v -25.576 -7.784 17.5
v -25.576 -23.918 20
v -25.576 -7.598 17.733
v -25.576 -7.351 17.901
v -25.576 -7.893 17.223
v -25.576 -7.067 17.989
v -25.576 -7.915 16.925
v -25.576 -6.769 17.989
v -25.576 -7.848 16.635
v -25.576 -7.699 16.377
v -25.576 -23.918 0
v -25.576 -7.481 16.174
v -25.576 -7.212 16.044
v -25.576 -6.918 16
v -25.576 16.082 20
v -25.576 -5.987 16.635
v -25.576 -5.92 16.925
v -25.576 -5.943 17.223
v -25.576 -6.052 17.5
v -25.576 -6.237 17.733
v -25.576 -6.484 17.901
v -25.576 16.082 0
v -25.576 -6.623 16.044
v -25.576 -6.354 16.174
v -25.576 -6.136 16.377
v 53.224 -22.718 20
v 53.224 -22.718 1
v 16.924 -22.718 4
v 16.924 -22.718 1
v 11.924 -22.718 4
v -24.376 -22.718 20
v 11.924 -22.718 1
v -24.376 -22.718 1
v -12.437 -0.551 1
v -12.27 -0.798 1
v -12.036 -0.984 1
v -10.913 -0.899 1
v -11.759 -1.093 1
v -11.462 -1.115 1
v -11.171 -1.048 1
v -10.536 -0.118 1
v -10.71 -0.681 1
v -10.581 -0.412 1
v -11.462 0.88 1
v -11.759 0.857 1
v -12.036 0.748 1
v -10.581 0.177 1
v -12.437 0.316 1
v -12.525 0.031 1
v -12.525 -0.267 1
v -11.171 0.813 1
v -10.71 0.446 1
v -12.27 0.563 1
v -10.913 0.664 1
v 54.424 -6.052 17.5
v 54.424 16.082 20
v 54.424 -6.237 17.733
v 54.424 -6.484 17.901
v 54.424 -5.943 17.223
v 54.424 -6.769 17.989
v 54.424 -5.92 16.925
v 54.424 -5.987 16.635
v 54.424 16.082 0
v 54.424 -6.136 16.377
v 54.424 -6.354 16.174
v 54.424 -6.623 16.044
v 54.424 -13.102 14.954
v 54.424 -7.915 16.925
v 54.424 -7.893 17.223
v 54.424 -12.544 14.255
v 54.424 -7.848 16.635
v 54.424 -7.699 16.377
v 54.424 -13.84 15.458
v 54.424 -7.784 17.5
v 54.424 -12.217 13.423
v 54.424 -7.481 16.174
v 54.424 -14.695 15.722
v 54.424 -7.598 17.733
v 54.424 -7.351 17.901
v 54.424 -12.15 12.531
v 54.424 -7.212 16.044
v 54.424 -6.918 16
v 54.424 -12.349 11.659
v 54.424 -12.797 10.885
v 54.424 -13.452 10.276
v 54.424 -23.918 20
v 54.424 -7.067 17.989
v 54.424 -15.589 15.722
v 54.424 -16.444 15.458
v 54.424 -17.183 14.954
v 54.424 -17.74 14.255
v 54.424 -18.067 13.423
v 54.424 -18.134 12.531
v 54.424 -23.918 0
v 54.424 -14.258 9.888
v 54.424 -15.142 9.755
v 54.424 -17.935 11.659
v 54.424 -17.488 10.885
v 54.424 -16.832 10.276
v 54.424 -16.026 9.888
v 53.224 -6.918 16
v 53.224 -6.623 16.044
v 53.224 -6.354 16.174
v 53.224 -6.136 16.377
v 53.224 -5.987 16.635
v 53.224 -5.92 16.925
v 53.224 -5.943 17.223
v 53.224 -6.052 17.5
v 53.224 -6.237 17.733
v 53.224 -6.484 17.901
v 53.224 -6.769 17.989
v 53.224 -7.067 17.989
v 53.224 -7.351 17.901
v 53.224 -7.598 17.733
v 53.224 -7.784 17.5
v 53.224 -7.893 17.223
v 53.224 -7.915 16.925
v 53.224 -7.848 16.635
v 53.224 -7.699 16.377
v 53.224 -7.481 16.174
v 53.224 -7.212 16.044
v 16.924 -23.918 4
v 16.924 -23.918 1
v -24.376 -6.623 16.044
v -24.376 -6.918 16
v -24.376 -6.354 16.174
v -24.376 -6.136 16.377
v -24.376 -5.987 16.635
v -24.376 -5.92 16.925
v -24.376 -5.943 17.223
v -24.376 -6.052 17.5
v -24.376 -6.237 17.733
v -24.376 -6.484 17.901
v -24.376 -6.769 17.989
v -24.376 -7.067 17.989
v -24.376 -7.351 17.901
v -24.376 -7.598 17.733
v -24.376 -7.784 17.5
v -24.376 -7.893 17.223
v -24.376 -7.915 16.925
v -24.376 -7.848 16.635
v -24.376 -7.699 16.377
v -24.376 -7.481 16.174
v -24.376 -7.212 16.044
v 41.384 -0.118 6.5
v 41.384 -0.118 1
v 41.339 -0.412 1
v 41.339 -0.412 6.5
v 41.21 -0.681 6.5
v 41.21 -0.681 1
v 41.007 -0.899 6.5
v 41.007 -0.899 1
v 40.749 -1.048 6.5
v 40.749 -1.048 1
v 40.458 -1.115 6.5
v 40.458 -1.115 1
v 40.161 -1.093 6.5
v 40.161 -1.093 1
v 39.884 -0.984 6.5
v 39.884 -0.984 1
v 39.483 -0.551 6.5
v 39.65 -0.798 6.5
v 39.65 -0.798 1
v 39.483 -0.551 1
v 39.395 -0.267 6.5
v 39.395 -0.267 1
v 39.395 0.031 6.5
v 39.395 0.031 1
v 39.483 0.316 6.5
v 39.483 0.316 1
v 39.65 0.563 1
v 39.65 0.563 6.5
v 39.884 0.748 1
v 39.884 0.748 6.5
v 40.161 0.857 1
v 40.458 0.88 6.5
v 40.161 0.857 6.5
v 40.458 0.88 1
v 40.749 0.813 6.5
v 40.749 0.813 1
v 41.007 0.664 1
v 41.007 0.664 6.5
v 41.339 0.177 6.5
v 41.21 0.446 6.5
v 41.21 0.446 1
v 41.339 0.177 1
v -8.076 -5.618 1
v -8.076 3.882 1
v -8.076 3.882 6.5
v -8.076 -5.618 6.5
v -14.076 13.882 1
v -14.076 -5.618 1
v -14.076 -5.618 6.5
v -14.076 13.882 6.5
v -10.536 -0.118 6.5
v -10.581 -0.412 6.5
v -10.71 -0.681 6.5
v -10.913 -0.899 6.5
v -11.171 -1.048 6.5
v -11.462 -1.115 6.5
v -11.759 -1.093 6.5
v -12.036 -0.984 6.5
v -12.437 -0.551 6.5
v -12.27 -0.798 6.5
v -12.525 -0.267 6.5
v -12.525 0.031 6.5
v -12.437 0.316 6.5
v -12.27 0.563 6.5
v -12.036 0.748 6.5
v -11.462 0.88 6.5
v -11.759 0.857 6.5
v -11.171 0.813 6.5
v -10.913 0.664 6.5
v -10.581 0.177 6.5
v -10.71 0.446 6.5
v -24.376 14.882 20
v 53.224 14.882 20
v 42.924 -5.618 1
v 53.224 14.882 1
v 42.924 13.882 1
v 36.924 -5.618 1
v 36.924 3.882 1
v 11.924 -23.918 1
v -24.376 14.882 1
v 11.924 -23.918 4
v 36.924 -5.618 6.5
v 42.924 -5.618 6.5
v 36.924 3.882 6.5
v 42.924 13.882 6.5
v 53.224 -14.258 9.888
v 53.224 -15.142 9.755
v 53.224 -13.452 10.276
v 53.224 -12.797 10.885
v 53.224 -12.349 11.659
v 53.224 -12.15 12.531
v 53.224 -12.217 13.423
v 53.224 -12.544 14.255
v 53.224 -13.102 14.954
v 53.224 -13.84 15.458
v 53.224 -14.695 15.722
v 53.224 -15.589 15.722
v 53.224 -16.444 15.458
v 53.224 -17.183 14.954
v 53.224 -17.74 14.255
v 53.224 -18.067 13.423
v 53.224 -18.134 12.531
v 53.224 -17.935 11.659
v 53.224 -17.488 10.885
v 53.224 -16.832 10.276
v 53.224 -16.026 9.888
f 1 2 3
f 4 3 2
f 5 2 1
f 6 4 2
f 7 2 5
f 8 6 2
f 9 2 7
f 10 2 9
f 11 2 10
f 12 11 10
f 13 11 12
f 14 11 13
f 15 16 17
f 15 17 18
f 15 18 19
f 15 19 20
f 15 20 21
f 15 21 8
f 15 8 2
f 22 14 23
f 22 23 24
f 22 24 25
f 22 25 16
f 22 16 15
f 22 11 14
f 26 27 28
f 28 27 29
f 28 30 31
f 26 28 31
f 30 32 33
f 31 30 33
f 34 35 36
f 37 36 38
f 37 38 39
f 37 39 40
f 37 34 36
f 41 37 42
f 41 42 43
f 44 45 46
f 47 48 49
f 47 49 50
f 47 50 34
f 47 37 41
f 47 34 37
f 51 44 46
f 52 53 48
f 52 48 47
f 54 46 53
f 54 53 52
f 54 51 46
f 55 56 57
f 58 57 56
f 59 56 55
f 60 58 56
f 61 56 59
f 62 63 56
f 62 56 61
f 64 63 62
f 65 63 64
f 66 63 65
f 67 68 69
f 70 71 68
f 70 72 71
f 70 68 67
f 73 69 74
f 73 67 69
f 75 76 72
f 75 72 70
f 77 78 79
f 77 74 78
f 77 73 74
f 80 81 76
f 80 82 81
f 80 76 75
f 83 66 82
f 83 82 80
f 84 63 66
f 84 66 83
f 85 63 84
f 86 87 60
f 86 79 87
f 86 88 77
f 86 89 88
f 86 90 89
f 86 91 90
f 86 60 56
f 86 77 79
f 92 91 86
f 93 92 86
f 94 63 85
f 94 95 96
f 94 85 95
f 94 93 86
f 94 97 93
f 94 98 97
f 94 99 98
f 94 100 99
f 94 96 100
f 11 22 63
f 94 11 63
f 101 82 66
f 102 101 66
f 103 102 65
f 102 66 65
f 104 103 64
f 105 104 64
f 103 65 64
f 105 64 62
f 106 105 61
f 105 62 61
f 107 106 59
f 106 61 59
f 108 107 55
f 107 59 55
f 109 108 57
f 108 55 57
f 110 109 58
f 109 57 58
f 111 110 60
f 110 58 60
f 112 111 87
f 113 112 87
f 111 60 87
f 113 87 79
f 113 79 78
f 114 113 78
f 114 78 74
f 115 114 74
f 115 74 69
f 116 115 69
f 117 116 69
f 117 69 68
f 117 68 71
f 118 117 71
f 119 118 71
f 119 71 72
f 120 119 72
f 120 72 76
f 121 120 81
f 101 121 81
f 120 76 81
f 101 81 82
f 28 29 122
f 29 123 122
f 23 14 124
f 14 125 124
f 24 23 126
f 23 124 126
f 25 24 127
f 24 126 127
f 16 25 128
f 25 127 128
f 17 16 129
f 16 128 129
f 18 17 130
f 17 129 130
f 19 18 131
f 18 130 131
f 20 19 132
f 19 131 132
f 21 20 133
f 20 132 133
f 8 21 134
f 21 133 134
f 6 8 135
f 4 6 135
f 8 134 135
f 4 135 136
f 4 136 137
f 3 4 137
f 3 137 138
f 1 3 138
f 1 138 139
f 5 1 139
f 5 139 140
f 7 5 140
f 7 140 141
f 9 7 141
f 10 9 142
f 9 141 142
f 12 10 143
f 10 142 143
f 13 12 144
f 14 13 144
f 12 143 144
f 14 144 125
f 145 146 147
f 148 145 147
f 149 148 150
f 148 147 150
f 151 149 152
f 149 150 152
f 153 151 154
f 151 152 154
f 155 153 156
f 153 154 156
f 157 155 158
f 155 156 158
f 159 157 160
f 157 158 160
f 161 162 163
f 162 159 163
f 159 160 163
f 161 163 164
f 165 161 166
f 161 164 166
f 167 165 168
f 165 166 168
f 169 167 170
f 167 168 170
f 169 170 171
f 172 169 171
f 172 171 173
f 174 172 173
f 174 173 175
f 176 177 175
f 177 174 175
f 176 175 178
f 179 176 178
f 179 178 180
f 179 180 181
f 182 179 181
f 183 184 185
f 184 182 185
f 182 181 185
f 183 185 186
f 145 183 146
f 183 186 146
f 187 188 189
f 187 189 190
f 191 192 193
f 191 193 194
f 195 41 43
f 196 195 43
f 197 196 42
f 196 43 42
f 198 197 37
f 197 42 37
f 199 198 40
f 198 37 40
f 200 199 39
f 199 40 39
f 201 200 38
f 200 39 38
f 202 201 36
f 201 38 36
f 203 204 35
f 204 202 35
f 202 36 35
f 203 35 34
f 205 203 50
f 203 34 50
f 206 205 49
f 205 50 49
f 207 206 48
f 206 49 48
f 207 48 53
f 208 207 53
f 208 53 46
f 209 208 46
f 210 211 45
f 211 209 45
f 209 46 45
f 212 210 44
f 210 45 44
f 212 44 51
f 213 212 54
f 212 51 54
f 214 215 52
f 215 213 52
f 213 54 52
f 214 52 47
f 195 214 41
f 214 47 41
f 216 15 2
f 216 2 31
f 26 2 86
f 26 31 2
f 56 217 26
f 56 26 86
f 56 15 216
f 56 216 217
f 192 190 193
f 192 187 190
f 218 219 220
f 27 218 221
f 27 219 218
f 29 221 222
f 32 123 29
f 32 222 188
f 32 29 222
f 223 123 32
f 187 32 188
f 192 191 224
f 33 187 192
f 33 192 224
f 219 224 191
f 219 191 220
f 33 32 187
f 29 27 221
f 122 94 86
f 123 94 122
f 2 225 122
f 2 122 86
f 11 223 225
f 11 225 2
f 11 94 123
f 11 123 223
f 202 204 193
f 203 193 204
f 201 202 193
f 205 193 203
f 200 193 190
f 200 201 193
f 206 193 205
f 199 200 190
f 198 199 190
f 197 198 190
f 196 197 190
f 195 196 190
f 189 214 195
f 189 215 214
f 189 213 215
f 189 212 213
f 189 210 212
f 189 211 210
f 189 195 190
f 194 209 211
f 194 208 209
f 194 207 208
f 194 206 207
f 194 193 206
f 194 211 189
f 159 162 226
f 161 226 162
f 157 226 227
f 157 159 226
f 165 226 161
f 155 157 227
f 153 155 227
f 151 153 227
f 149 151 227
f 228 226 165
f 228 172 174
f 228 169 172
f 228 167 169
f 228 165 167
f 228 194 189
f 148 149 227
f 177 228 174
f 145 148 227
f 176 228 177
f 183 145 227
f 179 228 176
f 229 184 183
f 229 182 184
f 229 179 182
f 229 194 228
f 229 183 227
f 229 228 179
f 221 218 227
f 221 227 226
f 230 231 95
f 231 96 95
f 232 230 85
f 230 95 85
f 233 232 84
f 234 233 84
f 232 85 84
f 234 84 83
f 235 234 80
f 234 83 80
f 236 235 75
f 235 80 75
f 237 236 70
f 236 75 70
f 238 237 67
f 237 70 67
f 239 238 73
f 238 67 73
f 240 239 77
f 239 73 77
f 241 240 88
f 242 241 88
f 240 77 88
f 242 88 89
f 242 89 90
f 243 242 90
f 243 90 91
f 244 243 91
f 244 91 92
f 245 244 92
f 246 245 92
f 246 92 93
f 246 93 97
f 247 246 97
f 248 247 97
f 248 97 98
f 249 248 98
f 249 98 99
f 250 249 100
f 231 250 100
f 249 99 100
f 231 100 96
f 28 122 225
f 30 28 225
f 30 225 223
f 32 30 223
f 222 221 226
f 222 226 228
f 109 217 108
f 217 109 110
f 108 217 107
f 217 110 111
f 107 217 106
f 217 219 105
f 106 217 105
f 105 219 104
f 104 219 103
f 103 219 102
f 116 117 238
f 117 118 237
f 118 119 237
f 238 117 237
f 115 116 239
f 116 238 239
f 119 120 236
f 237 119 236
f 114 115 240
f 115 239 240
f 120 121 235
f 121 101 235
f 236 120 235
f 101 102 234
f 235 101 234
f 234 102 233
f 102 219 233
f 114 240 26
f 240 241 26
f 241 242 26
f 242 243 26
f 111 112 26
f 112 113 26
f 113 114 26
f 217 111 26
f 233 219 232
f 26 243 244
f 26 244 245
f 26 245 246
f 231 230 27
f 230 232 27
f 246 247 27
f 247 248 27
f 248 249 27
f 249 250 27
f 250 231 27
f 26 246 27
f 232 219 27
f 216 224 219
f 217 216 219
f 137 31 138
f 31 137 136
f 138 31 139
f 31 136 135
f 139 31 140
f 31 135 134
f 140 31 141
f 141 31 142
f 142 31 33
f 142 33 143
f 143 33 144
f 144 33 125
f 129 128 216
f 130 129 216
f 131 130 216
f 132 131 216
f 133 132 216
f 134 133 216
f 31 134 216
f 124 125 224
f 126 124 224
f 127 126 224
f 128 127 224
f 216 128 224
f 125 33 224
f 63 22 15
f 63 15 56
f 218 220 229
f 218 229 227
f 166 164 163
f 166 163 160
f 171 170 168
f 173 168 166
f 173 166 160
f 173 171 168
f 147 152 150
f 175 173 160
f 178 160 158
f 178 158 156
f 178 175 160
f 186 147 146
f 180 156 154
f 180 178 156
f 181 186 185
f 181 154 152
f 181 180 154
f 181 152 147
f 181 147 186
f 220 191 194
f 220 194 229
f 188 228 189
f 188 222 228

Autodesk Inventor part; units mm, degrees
ref_plane "YZ Plane" through (0, 0, 0) normal (1, 0, 0) x (0, 1, 0)
ref_plane "XZ Plane" through (0, 0, 0) normal (0, 1, 0) x (-1, 0, 0)
ref_plane "XY Plane" through (0, 0, 0) normal (0, 0, 1) x (1, 0, 0)
sketch "Skizze1" plane through (0, 0, 0) normal (0, 0, 1) x (1, 0, 0)
  line L0 (-25.5765, 16.0824) -> (54.4235, 16.0824)
  line L1 (54.4235, 16.0824) -> (54.4235, -23.9176)
  line L2 (54.4235, -23.9176) -> (-25.5765, -23.9176)
  line L3 (-25.5765, -23.9176) -> (-25.5765, 16.0824)
  line L4 (-24.3765, 14.8824) -> (53.2235, 14.8824)
  line L5 (53.2235, 14.8824) -> (53.2235, -22.7176)
  line L6 (53.2235, -22.7176) -> (-24.3765, -22.7176)
  line L7 (-24.3765, -22.7176) -> (-24.3765, 14.8824)
  point P0 (0, 0)
  dimension "d0" = 80
  dimension "d1" = 40
  dimension "d2" = 1.2
  dimension "d3" = 1.2
  dimension "d4" = 1.2
  dimension "d5" = 1.2
extrude "Extrusion1" add sketch "Skizze1" along normal blind 1 contours L4 L5 L6 L7
extrude "Extrusion2" add sketch "Skizze1" along normal blind 20
sketch "Skizze2" plane through (0, 0, 1) normal (0, 0, 1) x (1, 0, 0)
  line L0 (-24.3765, 14.8824) -> (53.2235, 14.8824) projected
  line L1 (-21.8265, 14.8824) -> (50.6735, 14.8824)
  line L2 (50.6735, 14.8824) -> (50.6735, -5.6176)
  line L3 (50.6735, -5.6176) -> (-21.8265, -5.6176)
  line L4 (-21.8265, -5.6176) -> (-21.8265, 14.8824)
  line L5 (-24.3765, -22.7176) -> (-24.3765, 14.8824) projected
  line L6 (53.2235, 14.8824) -> (53.2235, -22.7176) projected
  line L7 (-14.0765, 13.8824) -> (42.9235, 13.8824)
  line L8 (42.9235, 13.8824) -> (42.9235, -6.1176)
  line L9 (42.9235, -6.1176) -> (-14.0765, -6.1176)
  line L10 (-14.0765, -6.1176) -> (-14.0765, 13.8824)
  line L11 (-8.0765, -6.1176) -> (36.9235, -6.1176)
  line L12 (36.9235, -6.1176) -> (36.9235, 3.8824)
  line L13 (36.9235, 3.8824) -> (-8.0765, 3.8824)
  line L14 (-8.0765, 3.8824) -> (-8.0765, -6.1176)
  circle A0 centre (40.3835, -0.1176) radius 1
  circle A1 centre (-11.5365, -0.1176) radius 1
  point P0 (0, 0)
  point P1 (-21.8265, 4.6324)
  point P2 (50.6735, 4.6324)
  point P3 (-14.0765, -5.6176)
  point P4 (-8.0765, -5.6176)
  point P5 (36.9235, -5.6176)
  point P6 (42.9235, -5.6176)
  dimension "d10" = 20.5
  dimension "d11" = 72.5
  dimension "d12" = 2.55
  dimension "d13" = 2.55
  dimension "d14" = 1
  dimension "d15" = 57
  dimension "d16" = 7.75
  dimension "d17" = 20
  dimension "d18" = 2
  dimension "d19" = 2
  dimension "d20" = 2.54
  dimension "d21" = 2.54
  dimension "d25" = 14
  dimension "d26" = 14
  dimension "d27" = 10
  dimension "d28" = 6
  dimension "d29" = 6
extrude "Extrusion3" add sketch "Skizze2" along normal blind 5.5 contours L10 L7 L8 L3 L12 L13 L14
sketch "Skizze3" plane through (54.4235, -23.9176, 0) normal (1, 0, 0) x (0, 0, -1)
  circle A0 centre (-17, 17) radius 1
  line L0 (0, 40) -> (-20, 40) projected
  line L1 (-20, 0) -> (-20, 40) projected
  circle A1 centre (-12.7552, 8.7755) radius 3
  point P0 (0, 23.9176)
  dimension "d32" = 2
  dimension "d33" = 23
  dimension "d34" = 3
  dimension "d35" = 6
extrude "Extrusion4" cut sketch "Skizze3" against normal through all contours A0
extrude "Extrusion5" cut sketch "Skizze3" against normal blind 1.2 contours A1
sketch "Skizze4" plane through (-25.5765, -23.9176, 0) normal (0, -1, 0) x (1, 0, 0)
  line L0 (78.8, 1) -> (1.2, 1) projected
  line L1 (37.5, 1) -> (42.5, 1)
  line L2 (42.5, 1) -> (42.5, 4)
  line L3 (42.5, 4) -> (37.5, 4)
  line L4 (37.5, 4) -> (37.5, 1)
  line L5 (0, 0) -> (0, 20) projected
  line L6 (80, 0) -> (80, 20) projected
  point P0 (25.5765, 0)
  point P1 (37.5, 2.5)
  point P2 (42.5, 2.5)
  dimension "d40" = 5
  dimension "d41" = 3
  dimension "d42" = 37.5
  dimension "d43" = 37.5
extrude "Extrusion6" cut sketch "Skizze4" against normal blind 1.2
properties part number "Konsole"
